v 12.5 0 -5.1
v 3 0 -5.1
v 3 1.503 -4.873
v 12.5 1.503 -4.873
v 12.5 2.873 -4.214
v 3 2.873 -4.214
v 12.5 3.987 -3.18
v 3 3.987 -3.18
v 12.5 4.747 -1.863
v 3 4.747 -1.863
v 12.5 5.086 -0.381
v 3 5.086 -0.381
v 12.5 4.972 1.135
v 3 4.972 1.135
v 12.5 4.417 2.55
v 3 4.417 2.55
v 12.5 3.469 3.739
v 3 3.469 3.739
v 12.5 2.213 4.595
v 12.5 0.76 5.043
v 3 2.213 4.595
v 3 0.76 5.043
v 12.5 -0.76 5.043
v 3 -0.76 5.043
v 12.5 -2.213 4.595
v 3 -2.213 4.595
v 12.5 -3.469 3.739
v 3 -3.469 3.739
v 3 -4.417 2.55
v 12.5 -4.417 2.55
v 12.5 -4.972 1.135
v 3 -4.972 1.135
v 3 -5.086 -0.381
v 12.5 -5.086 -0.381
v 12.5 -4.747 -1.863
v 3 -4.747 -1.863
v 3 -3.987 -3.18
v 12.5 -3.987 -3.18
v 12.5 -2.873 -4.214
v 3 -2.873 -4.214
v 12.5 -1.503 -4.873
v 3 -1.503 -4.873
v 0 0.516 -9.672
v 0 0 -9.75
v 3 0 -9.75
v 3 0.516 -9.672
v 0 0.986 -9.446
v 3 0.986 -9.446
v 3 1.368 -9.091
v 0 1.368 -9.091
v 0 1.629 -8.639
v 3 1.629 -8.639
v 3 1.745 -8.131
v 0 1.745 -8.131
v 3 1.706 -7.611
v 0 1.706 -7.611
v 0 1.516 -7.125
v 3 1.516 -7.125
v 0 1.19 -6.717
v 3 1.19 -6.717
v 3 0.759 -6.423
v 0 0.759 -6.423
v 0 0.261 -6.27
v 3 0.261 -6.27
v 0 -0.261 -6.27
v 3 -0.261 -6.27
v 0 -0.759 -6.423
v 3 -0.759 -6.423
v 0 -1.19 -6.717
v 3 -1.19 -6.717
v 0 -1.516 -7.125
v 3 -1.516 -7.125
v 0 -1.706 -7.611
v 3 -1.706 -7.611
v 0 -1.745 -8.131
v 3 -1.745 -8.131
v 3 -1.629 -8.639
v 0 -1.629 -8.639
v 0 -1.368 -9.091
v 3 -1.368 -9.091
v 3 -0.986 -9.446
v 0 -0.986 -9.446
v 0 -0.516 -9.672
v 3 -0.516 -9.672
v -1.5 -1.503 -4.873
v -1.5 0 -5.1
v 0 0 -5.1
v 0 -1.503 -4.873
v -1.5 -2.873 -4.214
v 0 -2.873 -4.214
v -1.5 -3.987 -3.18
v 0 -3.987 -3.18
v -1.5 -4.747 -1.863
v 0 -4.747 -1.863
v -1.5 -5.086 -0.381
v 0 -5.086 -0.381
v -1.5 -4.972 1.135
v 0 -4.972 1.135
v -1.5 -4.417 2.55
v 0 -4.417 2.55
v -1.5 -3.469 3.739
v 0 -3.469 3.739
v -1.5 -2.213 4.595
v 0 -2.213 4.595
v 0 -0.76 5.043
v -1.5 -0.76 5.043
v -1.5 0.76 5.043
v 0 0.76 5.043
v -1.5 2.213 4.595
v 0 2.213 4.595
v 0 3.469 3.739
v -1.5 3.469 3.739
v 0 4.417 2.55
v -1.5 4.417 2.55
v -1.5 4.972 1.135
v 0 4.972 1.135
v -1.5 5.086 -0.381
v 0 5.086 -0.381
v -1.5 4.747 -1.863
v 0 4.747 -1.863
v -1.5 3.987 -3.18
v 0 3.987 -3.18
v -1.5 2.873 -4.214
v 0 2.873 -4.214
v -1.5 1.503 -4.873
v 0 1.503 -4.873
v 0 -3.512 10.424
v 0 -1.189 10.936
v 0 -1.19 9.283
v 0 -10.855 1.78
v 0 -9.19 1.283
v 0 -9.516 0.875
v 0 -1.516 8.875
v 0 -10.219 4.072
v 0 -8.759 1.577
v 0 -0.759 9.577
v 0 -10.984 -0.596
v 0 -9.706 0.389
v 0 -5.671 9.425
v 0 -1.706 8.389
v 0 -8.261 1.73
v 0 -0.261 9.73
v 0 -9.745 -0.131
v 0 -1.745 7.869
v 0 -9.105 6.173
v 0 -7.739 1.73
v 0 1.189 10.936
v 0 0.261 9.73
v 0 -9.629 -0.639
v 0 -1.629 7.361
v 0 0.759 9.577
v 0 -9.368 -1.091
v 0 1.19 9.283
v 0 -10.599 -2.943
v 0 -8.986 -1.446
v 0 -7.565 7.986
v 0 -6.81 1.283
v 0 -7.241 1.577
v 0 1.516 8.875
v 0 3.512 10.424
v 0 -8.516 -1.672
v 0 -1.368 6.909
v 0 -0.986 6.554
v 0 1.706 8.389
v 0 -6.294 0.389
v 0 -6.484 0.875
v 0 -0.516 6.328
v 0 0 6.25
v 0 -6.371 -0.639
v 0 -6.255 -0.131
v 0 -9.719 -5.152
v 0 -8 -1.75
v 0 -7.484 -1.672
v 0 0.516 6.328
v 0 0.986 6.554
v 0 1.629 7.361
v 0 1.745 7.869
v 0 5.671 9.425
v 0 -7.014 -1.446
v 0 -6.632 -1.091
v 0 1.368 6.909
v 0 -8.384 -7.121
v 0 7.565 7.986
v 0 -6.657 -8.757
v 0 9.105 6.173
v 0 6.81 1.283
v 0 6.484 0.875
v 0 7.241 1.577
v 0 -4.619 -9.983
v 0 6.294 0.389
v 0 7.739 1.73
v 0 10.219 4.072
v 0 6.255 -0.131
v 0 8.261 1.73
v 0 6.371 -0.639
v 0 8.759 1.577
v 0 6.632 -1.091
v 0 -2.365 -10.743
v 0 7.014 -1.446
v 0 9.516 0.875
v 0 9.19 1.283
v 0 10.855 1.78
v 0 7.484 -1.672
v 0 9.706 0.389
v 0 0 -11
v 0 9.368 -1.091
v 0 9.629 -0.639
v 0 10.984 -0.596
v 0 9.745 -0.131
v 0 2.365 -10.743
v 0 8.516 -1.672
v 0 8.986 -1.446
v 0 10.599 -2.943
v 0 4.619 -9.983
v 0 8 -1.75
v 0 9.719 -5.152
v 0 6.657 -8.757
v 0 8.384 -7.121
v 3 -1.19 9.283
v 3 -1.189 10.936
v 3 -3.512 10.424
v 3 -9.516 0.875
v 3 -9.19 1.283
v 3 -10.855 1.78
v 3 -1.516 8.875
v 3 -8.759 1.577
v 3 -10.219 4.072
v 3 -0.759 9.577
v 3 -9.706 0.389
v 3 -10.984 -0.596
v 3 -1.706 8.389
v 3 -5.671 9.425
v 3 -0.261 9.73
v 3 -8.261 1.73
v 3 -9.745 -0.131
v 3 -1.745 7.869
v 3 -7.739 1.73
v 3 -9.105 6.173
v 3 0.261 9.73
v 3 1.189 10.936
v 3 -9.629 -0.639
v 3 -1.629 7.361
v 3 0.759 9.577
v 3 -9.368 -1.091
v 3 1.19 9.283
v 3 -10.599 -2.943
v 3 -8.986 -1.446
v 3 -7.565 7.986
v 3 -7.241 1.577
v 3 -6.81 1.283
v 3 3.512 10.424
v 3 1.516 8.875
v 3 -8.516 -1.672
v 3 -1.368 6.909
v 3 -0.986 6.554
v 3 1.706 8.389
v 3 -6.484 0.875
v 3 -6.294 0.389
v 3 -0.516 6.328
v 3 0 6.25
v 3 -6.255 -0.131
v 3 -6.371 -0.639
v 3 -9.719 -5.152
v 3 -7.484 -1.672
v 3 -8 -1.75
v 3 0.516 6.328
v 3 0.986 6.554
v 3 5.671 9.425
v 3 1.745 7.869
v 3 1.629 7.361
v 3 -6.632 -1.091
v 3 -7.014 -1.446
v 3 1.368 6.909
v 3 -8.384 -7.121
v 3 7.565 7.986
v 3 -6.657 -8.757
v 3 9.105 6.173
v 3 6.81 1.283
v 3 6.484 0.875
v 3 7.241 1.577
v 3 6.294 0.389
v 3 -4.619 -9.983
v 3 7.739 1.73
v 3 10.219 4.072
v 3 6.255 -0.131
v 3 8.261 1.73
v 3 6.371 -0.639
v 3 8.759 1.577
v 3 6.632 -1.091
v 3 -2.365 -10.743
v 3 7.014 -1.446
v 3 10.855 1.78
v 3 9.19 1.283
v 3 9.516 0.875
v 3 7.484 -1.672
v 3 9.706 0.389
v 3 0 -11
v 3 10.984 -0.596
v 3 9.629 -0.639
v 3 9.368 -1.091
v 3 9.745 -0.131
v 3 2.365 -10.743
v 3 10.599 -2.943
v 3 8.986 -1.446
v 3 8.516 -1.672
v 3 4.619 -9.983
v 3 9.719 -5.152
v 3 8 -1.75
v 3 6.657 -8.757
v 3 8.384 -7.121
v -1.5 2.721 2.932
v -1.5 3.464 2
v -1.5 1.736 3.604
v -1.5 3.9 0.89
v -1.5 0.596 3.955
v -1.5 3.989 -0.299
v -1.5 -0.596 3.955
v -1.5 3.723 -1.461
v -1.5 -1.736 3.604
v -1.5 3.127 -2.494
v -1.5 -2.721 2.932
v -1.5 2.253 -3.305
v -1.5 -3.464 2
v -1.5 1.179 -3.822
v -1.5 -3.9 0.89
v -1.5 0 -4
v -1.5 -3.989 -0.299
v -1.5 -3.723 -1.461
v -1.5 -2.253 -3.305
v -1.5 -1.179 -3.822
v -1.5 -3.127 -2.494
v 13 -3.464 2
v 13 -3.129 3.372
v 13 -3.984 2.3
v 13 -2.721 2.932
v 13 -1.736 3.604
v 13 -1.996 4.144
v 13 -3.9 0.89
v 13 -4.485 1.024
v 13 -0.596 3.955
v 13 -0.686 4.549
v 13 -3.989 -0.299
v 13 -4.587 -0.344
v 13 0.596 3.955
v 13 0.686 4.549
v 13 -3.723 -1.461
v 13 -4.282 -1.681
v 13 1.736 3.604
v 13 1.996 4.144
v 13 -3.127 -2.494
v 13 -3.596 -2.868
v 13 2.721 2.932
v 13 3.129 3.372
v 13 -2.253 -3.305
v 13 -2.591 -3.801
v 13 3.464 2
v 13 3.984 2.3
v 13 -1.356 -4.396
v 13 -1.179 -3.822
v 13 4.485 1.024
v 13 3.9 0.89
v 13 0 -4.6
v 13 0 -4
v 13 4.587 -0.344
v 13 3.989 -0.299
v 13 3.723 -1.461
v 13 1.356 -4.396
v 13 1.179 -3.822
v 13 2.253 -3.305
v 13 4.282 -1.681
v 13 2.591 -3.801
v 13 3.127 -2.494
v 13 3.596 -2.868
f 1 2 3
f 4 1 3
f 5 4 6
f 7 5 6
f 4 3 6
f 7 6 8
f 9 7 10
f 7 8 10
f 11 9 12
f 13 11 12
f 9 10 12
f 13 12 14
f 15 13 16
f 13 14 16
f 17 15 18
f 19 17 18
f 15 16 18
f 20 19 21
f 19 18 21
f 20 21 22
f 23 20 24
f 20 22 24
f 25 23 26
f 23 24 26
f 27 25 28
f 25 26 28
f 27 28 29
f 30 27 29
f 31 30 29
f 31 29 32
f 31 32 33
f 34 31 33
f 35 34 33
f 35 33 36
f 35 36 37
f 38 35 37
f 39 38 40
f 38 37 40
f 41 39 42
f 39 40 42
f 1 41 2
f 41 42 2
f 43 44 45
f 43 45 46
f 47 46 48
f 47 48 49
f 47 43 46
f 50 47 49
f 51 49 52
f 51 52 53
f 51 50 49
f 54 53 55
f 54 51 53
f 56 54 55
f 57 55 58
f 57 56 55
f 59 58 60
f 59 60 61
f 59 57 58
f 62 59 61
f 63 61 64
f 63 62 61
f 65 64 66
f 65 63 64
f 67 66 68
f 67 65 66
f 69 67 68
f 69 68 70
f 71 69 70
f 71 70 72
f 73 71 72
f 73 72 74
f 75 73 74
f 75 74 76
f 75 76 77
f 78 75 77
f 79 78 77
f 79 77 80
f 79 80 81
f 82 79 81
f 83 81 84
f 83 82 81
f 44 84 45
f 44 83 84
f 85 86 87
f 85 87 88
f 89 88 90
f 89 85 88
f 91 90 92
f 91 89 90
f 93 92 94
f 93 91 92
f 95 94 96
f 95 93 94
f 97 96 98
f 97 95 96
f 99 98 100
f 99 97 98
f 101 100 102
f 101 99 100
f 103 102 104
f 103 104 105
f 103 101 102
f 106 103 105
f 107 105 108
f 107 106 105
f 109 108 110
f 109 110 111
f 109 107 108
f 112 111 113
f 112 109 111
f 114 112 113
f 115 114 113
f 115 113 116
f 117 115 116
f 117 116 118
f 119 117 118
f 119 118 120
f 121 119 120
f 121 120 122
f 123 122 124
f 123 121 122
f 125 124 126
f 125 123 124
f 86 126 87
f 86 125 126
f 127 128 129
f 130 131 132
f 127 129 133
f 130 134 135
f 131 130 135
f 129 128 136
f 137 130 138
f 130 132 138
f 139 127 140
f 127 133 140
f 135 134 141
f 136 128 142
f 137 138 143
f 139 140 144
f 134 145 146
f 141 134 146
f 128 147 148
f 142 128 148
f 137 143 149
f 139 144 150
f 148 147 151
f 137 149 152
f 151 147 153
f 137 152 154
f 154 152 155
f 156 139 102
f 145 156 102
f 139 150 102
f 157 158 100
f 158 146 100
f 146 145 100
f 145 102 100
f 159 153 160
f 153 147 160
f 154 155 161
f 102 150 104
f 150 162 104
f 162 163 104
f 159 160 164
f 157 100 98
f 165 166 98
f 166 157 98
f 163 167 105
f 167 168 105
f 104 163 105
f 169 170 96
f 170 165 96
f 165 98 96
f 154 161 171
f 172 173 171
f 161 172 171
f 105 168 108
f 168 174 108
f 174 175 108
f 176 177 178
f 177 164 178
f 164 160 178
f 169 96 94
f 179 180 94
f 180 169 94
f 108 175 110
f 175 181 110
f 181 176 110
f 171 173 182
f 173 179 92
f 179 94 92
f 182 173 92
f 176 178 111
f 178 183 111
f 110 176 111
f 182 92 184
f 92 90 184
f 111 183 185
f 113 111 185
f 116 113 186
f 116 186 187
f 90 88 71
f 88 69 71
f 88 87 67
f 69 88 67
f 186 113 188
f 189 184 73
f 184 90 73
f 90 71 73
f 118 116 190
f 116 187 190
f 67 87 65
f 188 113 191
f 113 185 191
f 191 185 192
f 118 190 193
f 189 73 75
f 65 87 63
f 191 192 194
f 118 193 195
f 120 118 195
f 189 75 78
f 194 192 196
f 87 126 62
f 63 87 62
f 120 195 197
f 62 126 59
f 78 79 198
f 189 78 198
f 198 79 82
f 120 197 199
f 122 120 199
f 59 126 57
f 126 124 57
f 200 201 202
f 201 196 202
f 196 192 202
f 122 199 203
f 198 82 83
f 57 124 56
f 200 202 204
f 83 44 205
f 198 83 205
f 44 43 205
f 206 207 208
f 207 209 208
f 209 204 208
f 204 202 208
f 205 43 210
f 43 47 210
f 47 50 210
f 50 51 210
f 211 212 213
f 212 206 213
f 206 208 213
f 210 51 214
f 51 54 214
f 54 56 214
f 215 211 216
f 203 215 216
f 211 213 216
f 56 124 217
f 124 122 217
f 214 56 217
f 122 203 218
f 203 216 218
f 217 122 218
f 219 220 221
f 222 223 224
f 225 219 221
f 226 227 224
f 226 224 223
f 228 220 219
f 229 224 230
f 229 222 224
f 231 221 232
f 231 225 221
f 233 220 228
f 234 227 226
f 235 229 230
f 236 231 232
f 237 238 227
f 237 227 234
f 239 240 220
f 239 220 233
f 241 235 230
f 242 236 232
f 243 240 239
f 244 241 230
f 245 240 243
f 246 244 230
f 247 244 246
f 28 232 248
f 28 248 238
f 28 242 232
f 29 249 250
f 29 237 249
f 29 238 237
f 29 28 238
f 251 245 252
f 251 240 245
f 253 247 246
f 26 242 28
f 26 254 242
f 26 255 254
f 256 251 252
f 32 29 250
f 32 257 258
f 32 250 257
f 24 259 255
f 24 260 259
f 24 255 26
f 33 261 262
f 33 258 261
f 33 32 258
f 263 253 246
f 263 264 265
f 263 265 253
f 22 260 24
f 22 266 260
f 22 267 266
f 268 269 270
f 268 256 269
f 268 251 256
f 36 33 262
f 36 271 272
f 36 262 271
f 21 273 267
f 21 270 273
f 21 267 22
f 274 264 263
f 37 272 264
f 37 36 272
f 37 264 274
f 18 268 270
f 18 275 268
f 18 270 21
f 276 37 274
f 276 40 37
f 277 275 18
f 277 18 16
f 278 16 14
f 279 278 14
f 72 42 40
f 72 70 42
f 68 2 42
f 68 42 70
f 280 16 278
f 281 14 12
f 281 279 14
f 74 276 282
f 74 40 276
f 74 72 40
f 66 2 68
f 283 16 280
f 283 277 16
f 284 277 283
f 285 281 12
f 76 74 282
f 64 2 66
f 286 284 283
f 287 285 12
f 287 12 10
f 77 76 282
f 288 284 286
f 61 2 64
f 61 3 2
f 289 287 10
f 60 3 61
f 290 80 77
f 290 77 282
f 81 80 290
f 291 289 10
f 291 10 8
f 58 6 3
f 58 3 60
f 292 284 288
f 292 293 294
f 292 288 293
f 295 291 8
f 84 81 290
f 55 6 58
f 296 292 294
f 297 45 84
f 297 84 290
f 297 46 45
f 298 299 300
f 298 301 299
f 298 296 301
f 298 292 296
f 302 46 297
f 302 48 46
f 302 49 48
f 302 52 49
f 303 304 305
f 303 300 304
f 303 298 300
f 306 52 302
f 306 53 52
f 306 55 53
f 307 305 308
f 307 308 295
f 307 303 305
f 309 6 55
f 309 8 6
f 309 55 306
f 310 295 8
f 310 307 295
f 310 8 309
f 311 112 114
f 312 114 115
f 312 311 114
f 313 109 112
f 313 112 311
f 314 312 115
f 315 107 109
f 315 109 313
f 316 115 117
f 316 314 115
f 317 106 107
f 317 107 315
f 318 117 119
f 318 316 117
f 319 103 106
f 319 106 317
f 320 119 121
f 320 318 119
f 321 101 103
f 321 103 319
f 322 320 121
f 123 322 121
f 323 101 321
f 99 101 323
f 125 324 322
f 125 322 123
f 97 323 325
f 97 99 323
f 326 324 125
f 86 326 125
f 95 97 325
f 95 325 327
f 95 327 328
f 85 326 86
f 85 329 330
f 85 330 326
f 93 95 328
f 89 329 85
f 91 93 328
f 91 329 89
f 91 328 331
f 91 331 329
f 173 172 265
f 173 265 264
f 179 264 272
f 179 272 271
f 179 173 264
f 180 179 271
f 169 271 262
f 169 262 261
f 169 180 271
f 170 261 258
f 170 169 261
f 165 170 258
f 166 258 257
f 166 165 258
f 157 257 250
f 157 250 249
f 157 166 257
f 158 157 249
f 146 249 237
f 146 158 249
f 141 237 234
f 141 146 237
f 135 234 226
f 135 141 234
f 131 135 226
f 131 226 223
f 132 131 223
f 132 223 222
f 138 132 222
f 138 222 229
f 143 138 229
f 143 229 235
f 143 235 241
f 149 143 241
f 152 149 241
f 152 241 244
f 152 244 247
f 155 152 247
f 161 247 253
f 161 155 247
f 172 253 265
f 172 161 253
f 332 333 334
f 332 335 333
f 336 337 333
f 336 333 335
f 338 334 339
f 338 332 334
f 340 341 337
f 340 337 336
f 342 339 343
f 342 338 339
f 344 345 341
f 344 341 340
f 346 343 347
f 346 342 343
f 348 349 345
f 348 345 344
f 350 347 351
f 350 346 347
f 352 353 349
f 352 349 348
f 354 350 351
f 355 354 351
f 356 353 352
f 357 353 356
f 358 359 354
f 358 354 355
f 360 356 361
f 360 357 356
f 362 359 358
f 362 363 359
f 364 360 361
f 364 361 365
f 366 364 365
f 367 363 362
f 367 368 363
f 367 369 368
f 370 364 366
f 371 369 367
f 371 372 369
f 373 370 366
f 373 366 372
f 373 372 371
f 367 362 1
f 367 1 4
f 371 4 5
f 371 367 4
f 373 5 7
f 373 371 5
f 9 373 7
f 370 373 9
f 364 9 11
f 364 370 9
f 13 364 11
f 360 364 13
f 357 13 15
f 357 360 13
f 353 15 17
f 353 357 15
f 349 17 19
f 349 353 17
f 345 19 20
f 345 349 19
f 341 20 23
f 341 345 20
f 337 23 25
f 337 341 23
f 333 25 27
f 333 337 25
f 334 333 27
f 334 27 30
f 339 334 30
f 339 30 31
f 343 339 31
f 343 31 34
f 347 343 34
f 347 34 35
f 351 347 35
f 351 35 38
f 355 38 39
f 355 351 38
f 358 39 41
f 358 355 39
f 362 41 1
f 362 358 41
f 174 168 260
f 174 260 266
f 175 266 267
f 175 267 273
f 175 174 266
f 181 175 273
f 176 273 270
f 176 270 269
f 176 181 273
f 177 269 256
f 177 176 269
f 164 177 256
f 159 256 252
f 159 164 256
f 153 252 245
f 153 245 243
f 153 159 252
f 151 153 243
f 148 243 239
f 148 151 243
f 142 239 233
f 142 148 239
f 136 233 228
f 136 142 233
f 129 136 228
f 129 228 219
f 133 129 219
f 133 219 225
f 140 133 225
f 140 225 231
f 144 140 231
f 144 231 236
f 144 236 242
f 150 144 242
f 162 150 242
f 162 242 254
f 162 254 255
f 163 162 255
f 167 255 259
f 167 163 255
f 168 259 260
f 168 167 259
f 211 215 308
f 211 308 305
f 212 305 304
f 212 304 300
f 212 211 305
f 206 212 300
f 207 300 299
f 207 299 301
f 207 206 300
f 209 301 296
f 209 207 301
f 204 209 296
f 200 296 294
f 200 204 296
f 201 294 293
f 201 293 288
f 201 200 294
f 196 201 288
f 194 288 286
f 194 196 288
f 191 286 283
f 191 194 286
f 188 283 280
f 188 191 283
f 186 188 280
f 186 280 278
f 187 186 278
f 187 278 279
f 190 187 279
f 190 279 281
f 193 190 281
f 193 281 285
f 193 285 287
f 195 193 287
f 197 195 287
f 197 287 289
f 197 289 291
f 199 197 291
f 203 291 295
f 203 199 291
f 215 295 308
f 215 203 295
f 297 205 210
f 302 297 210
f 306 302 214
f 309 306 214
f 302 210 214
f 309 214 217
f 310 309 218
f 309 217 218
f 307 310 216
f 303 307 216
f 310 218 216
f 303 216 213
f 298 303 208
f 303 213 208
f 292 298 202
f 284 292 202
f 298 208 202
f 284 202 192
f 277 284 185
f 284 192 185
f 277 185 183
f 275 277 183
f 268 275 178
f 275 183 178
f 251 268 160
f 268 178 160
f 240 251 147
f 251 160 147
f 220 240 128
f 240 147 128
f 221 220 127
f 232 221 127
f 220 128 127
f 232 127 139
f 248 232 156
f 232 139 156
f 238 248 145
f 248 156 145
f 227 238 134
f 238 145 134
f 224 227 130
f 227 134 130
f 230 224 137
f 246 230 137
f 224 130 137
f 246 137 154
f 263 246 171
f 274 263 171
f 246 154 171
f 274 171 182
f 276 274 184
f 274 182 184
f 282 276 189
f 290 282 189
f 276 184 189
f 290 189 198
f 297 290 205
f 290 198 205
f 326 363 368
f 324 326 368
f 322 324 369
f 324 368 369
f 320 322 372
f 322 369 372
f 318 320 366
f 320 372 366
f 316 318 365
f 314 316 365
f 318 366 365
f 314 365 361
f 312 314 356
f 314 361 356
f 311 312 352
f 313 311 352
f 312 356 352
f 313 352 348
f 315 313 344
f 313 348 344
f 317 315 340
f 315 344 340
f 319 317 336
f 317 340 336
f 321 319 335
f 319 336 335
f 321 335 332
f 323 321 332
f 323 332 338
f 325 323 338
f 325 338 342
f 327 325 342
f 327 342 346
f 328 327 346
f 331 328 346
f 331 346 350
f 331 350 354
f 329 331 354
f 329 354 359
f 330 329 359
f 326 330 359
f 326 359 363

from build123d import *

# Parameters (mm, degrees)
CROQUIS1_R              = 11
CROQUIS1_R_2            = 1.75
SALIENTE_EXTRUIR1_DEPTH = 3
CROQUIS2_R              = 5.1
SALIENTE_EXTRUIR2_DEPTH = 10
CHAFL_N1_SIZE           = 0.5
SALIENTE_EXTRUIR3_START = 1.5
CROQUIS3_R              = 5.1
SALIENTE_EXTRUIR3_DEPTH = 1.5
CROQUIS4_R              = 4
CORTAR_EXTRUIR1_DEPTH   = 22.266170318


with BuildPart() as part:
    # Croquis1 → Saliente-Extruir1 (new body)
    with BuildSketch(Plane(origin=(0, 0, 0), x_dir=(0, 0, -1), z_dir=(1, 0, 0))):
        Circle(CROQUIS1_R)
        with Locations((0, 8)):
            Circle(CROQUIS1_R_2, mode=Mode.SUBTRACT)
        with Locations((8, 0)):
            Circle(CROQUIS1_R_2, mode=Mode.SUBTRACT)
        with Locations((0, -8)):
            Circle(CROQUIS1_R_2, mode=Mode.SUBTRACT)
        with Locations((-8, 0)):
            Circle(CROQUIS1_R_2, mode=Mode.SUBTRACT)
    extrude(amount=SALIENTE_EXTRUIR1_DEPTH)

    # Croquis2 → Saliente-Extruir2 (add)
    with BuildSketch(Plane(origin=(3, 0, 0), x_dir=(0, 0, -1), z_dir=(1, 0, 0))):
        Circle(CROQUIS2_R)
    extrude(amount=SALIENTE_EXTRUIR2_DEPTH)

    # Chaflán1
    chafl_n1_edges = [part.edges().sort_by_distance(p)[0] for p in [
        (13, 0, 5.1),
    ]]
    chamfer(chafl_n1_edges, length=CHAFL_N1_SIZE)

    # Croquis3 → Saliente-Extruir3 (add)
    with BuildSketch(Plane.ZY.offset(SALIENTE_EXTRUIR3_START)):
        with Locations(Location((0, 0, 0), (0, 0, 180))):
            Circle(CROQUIS3_R)
    extrude(amount=-SALIENTE_EXTRUIR3_DEPTH)

    # Croquis4 → Cortar-Extruir1 (cut, through all)
    with BuildSketch(Plane(origin=(13, 0, 0), x_dir=(0, 0, -1), z_dir=(1, 0, 0))):
        Circle(CROQUIS4_R)
    extrude(amount=-CORTAR_EXTRUIR1_DEPTH, mode=Mode.SUBTRACT)


solid = part.part
